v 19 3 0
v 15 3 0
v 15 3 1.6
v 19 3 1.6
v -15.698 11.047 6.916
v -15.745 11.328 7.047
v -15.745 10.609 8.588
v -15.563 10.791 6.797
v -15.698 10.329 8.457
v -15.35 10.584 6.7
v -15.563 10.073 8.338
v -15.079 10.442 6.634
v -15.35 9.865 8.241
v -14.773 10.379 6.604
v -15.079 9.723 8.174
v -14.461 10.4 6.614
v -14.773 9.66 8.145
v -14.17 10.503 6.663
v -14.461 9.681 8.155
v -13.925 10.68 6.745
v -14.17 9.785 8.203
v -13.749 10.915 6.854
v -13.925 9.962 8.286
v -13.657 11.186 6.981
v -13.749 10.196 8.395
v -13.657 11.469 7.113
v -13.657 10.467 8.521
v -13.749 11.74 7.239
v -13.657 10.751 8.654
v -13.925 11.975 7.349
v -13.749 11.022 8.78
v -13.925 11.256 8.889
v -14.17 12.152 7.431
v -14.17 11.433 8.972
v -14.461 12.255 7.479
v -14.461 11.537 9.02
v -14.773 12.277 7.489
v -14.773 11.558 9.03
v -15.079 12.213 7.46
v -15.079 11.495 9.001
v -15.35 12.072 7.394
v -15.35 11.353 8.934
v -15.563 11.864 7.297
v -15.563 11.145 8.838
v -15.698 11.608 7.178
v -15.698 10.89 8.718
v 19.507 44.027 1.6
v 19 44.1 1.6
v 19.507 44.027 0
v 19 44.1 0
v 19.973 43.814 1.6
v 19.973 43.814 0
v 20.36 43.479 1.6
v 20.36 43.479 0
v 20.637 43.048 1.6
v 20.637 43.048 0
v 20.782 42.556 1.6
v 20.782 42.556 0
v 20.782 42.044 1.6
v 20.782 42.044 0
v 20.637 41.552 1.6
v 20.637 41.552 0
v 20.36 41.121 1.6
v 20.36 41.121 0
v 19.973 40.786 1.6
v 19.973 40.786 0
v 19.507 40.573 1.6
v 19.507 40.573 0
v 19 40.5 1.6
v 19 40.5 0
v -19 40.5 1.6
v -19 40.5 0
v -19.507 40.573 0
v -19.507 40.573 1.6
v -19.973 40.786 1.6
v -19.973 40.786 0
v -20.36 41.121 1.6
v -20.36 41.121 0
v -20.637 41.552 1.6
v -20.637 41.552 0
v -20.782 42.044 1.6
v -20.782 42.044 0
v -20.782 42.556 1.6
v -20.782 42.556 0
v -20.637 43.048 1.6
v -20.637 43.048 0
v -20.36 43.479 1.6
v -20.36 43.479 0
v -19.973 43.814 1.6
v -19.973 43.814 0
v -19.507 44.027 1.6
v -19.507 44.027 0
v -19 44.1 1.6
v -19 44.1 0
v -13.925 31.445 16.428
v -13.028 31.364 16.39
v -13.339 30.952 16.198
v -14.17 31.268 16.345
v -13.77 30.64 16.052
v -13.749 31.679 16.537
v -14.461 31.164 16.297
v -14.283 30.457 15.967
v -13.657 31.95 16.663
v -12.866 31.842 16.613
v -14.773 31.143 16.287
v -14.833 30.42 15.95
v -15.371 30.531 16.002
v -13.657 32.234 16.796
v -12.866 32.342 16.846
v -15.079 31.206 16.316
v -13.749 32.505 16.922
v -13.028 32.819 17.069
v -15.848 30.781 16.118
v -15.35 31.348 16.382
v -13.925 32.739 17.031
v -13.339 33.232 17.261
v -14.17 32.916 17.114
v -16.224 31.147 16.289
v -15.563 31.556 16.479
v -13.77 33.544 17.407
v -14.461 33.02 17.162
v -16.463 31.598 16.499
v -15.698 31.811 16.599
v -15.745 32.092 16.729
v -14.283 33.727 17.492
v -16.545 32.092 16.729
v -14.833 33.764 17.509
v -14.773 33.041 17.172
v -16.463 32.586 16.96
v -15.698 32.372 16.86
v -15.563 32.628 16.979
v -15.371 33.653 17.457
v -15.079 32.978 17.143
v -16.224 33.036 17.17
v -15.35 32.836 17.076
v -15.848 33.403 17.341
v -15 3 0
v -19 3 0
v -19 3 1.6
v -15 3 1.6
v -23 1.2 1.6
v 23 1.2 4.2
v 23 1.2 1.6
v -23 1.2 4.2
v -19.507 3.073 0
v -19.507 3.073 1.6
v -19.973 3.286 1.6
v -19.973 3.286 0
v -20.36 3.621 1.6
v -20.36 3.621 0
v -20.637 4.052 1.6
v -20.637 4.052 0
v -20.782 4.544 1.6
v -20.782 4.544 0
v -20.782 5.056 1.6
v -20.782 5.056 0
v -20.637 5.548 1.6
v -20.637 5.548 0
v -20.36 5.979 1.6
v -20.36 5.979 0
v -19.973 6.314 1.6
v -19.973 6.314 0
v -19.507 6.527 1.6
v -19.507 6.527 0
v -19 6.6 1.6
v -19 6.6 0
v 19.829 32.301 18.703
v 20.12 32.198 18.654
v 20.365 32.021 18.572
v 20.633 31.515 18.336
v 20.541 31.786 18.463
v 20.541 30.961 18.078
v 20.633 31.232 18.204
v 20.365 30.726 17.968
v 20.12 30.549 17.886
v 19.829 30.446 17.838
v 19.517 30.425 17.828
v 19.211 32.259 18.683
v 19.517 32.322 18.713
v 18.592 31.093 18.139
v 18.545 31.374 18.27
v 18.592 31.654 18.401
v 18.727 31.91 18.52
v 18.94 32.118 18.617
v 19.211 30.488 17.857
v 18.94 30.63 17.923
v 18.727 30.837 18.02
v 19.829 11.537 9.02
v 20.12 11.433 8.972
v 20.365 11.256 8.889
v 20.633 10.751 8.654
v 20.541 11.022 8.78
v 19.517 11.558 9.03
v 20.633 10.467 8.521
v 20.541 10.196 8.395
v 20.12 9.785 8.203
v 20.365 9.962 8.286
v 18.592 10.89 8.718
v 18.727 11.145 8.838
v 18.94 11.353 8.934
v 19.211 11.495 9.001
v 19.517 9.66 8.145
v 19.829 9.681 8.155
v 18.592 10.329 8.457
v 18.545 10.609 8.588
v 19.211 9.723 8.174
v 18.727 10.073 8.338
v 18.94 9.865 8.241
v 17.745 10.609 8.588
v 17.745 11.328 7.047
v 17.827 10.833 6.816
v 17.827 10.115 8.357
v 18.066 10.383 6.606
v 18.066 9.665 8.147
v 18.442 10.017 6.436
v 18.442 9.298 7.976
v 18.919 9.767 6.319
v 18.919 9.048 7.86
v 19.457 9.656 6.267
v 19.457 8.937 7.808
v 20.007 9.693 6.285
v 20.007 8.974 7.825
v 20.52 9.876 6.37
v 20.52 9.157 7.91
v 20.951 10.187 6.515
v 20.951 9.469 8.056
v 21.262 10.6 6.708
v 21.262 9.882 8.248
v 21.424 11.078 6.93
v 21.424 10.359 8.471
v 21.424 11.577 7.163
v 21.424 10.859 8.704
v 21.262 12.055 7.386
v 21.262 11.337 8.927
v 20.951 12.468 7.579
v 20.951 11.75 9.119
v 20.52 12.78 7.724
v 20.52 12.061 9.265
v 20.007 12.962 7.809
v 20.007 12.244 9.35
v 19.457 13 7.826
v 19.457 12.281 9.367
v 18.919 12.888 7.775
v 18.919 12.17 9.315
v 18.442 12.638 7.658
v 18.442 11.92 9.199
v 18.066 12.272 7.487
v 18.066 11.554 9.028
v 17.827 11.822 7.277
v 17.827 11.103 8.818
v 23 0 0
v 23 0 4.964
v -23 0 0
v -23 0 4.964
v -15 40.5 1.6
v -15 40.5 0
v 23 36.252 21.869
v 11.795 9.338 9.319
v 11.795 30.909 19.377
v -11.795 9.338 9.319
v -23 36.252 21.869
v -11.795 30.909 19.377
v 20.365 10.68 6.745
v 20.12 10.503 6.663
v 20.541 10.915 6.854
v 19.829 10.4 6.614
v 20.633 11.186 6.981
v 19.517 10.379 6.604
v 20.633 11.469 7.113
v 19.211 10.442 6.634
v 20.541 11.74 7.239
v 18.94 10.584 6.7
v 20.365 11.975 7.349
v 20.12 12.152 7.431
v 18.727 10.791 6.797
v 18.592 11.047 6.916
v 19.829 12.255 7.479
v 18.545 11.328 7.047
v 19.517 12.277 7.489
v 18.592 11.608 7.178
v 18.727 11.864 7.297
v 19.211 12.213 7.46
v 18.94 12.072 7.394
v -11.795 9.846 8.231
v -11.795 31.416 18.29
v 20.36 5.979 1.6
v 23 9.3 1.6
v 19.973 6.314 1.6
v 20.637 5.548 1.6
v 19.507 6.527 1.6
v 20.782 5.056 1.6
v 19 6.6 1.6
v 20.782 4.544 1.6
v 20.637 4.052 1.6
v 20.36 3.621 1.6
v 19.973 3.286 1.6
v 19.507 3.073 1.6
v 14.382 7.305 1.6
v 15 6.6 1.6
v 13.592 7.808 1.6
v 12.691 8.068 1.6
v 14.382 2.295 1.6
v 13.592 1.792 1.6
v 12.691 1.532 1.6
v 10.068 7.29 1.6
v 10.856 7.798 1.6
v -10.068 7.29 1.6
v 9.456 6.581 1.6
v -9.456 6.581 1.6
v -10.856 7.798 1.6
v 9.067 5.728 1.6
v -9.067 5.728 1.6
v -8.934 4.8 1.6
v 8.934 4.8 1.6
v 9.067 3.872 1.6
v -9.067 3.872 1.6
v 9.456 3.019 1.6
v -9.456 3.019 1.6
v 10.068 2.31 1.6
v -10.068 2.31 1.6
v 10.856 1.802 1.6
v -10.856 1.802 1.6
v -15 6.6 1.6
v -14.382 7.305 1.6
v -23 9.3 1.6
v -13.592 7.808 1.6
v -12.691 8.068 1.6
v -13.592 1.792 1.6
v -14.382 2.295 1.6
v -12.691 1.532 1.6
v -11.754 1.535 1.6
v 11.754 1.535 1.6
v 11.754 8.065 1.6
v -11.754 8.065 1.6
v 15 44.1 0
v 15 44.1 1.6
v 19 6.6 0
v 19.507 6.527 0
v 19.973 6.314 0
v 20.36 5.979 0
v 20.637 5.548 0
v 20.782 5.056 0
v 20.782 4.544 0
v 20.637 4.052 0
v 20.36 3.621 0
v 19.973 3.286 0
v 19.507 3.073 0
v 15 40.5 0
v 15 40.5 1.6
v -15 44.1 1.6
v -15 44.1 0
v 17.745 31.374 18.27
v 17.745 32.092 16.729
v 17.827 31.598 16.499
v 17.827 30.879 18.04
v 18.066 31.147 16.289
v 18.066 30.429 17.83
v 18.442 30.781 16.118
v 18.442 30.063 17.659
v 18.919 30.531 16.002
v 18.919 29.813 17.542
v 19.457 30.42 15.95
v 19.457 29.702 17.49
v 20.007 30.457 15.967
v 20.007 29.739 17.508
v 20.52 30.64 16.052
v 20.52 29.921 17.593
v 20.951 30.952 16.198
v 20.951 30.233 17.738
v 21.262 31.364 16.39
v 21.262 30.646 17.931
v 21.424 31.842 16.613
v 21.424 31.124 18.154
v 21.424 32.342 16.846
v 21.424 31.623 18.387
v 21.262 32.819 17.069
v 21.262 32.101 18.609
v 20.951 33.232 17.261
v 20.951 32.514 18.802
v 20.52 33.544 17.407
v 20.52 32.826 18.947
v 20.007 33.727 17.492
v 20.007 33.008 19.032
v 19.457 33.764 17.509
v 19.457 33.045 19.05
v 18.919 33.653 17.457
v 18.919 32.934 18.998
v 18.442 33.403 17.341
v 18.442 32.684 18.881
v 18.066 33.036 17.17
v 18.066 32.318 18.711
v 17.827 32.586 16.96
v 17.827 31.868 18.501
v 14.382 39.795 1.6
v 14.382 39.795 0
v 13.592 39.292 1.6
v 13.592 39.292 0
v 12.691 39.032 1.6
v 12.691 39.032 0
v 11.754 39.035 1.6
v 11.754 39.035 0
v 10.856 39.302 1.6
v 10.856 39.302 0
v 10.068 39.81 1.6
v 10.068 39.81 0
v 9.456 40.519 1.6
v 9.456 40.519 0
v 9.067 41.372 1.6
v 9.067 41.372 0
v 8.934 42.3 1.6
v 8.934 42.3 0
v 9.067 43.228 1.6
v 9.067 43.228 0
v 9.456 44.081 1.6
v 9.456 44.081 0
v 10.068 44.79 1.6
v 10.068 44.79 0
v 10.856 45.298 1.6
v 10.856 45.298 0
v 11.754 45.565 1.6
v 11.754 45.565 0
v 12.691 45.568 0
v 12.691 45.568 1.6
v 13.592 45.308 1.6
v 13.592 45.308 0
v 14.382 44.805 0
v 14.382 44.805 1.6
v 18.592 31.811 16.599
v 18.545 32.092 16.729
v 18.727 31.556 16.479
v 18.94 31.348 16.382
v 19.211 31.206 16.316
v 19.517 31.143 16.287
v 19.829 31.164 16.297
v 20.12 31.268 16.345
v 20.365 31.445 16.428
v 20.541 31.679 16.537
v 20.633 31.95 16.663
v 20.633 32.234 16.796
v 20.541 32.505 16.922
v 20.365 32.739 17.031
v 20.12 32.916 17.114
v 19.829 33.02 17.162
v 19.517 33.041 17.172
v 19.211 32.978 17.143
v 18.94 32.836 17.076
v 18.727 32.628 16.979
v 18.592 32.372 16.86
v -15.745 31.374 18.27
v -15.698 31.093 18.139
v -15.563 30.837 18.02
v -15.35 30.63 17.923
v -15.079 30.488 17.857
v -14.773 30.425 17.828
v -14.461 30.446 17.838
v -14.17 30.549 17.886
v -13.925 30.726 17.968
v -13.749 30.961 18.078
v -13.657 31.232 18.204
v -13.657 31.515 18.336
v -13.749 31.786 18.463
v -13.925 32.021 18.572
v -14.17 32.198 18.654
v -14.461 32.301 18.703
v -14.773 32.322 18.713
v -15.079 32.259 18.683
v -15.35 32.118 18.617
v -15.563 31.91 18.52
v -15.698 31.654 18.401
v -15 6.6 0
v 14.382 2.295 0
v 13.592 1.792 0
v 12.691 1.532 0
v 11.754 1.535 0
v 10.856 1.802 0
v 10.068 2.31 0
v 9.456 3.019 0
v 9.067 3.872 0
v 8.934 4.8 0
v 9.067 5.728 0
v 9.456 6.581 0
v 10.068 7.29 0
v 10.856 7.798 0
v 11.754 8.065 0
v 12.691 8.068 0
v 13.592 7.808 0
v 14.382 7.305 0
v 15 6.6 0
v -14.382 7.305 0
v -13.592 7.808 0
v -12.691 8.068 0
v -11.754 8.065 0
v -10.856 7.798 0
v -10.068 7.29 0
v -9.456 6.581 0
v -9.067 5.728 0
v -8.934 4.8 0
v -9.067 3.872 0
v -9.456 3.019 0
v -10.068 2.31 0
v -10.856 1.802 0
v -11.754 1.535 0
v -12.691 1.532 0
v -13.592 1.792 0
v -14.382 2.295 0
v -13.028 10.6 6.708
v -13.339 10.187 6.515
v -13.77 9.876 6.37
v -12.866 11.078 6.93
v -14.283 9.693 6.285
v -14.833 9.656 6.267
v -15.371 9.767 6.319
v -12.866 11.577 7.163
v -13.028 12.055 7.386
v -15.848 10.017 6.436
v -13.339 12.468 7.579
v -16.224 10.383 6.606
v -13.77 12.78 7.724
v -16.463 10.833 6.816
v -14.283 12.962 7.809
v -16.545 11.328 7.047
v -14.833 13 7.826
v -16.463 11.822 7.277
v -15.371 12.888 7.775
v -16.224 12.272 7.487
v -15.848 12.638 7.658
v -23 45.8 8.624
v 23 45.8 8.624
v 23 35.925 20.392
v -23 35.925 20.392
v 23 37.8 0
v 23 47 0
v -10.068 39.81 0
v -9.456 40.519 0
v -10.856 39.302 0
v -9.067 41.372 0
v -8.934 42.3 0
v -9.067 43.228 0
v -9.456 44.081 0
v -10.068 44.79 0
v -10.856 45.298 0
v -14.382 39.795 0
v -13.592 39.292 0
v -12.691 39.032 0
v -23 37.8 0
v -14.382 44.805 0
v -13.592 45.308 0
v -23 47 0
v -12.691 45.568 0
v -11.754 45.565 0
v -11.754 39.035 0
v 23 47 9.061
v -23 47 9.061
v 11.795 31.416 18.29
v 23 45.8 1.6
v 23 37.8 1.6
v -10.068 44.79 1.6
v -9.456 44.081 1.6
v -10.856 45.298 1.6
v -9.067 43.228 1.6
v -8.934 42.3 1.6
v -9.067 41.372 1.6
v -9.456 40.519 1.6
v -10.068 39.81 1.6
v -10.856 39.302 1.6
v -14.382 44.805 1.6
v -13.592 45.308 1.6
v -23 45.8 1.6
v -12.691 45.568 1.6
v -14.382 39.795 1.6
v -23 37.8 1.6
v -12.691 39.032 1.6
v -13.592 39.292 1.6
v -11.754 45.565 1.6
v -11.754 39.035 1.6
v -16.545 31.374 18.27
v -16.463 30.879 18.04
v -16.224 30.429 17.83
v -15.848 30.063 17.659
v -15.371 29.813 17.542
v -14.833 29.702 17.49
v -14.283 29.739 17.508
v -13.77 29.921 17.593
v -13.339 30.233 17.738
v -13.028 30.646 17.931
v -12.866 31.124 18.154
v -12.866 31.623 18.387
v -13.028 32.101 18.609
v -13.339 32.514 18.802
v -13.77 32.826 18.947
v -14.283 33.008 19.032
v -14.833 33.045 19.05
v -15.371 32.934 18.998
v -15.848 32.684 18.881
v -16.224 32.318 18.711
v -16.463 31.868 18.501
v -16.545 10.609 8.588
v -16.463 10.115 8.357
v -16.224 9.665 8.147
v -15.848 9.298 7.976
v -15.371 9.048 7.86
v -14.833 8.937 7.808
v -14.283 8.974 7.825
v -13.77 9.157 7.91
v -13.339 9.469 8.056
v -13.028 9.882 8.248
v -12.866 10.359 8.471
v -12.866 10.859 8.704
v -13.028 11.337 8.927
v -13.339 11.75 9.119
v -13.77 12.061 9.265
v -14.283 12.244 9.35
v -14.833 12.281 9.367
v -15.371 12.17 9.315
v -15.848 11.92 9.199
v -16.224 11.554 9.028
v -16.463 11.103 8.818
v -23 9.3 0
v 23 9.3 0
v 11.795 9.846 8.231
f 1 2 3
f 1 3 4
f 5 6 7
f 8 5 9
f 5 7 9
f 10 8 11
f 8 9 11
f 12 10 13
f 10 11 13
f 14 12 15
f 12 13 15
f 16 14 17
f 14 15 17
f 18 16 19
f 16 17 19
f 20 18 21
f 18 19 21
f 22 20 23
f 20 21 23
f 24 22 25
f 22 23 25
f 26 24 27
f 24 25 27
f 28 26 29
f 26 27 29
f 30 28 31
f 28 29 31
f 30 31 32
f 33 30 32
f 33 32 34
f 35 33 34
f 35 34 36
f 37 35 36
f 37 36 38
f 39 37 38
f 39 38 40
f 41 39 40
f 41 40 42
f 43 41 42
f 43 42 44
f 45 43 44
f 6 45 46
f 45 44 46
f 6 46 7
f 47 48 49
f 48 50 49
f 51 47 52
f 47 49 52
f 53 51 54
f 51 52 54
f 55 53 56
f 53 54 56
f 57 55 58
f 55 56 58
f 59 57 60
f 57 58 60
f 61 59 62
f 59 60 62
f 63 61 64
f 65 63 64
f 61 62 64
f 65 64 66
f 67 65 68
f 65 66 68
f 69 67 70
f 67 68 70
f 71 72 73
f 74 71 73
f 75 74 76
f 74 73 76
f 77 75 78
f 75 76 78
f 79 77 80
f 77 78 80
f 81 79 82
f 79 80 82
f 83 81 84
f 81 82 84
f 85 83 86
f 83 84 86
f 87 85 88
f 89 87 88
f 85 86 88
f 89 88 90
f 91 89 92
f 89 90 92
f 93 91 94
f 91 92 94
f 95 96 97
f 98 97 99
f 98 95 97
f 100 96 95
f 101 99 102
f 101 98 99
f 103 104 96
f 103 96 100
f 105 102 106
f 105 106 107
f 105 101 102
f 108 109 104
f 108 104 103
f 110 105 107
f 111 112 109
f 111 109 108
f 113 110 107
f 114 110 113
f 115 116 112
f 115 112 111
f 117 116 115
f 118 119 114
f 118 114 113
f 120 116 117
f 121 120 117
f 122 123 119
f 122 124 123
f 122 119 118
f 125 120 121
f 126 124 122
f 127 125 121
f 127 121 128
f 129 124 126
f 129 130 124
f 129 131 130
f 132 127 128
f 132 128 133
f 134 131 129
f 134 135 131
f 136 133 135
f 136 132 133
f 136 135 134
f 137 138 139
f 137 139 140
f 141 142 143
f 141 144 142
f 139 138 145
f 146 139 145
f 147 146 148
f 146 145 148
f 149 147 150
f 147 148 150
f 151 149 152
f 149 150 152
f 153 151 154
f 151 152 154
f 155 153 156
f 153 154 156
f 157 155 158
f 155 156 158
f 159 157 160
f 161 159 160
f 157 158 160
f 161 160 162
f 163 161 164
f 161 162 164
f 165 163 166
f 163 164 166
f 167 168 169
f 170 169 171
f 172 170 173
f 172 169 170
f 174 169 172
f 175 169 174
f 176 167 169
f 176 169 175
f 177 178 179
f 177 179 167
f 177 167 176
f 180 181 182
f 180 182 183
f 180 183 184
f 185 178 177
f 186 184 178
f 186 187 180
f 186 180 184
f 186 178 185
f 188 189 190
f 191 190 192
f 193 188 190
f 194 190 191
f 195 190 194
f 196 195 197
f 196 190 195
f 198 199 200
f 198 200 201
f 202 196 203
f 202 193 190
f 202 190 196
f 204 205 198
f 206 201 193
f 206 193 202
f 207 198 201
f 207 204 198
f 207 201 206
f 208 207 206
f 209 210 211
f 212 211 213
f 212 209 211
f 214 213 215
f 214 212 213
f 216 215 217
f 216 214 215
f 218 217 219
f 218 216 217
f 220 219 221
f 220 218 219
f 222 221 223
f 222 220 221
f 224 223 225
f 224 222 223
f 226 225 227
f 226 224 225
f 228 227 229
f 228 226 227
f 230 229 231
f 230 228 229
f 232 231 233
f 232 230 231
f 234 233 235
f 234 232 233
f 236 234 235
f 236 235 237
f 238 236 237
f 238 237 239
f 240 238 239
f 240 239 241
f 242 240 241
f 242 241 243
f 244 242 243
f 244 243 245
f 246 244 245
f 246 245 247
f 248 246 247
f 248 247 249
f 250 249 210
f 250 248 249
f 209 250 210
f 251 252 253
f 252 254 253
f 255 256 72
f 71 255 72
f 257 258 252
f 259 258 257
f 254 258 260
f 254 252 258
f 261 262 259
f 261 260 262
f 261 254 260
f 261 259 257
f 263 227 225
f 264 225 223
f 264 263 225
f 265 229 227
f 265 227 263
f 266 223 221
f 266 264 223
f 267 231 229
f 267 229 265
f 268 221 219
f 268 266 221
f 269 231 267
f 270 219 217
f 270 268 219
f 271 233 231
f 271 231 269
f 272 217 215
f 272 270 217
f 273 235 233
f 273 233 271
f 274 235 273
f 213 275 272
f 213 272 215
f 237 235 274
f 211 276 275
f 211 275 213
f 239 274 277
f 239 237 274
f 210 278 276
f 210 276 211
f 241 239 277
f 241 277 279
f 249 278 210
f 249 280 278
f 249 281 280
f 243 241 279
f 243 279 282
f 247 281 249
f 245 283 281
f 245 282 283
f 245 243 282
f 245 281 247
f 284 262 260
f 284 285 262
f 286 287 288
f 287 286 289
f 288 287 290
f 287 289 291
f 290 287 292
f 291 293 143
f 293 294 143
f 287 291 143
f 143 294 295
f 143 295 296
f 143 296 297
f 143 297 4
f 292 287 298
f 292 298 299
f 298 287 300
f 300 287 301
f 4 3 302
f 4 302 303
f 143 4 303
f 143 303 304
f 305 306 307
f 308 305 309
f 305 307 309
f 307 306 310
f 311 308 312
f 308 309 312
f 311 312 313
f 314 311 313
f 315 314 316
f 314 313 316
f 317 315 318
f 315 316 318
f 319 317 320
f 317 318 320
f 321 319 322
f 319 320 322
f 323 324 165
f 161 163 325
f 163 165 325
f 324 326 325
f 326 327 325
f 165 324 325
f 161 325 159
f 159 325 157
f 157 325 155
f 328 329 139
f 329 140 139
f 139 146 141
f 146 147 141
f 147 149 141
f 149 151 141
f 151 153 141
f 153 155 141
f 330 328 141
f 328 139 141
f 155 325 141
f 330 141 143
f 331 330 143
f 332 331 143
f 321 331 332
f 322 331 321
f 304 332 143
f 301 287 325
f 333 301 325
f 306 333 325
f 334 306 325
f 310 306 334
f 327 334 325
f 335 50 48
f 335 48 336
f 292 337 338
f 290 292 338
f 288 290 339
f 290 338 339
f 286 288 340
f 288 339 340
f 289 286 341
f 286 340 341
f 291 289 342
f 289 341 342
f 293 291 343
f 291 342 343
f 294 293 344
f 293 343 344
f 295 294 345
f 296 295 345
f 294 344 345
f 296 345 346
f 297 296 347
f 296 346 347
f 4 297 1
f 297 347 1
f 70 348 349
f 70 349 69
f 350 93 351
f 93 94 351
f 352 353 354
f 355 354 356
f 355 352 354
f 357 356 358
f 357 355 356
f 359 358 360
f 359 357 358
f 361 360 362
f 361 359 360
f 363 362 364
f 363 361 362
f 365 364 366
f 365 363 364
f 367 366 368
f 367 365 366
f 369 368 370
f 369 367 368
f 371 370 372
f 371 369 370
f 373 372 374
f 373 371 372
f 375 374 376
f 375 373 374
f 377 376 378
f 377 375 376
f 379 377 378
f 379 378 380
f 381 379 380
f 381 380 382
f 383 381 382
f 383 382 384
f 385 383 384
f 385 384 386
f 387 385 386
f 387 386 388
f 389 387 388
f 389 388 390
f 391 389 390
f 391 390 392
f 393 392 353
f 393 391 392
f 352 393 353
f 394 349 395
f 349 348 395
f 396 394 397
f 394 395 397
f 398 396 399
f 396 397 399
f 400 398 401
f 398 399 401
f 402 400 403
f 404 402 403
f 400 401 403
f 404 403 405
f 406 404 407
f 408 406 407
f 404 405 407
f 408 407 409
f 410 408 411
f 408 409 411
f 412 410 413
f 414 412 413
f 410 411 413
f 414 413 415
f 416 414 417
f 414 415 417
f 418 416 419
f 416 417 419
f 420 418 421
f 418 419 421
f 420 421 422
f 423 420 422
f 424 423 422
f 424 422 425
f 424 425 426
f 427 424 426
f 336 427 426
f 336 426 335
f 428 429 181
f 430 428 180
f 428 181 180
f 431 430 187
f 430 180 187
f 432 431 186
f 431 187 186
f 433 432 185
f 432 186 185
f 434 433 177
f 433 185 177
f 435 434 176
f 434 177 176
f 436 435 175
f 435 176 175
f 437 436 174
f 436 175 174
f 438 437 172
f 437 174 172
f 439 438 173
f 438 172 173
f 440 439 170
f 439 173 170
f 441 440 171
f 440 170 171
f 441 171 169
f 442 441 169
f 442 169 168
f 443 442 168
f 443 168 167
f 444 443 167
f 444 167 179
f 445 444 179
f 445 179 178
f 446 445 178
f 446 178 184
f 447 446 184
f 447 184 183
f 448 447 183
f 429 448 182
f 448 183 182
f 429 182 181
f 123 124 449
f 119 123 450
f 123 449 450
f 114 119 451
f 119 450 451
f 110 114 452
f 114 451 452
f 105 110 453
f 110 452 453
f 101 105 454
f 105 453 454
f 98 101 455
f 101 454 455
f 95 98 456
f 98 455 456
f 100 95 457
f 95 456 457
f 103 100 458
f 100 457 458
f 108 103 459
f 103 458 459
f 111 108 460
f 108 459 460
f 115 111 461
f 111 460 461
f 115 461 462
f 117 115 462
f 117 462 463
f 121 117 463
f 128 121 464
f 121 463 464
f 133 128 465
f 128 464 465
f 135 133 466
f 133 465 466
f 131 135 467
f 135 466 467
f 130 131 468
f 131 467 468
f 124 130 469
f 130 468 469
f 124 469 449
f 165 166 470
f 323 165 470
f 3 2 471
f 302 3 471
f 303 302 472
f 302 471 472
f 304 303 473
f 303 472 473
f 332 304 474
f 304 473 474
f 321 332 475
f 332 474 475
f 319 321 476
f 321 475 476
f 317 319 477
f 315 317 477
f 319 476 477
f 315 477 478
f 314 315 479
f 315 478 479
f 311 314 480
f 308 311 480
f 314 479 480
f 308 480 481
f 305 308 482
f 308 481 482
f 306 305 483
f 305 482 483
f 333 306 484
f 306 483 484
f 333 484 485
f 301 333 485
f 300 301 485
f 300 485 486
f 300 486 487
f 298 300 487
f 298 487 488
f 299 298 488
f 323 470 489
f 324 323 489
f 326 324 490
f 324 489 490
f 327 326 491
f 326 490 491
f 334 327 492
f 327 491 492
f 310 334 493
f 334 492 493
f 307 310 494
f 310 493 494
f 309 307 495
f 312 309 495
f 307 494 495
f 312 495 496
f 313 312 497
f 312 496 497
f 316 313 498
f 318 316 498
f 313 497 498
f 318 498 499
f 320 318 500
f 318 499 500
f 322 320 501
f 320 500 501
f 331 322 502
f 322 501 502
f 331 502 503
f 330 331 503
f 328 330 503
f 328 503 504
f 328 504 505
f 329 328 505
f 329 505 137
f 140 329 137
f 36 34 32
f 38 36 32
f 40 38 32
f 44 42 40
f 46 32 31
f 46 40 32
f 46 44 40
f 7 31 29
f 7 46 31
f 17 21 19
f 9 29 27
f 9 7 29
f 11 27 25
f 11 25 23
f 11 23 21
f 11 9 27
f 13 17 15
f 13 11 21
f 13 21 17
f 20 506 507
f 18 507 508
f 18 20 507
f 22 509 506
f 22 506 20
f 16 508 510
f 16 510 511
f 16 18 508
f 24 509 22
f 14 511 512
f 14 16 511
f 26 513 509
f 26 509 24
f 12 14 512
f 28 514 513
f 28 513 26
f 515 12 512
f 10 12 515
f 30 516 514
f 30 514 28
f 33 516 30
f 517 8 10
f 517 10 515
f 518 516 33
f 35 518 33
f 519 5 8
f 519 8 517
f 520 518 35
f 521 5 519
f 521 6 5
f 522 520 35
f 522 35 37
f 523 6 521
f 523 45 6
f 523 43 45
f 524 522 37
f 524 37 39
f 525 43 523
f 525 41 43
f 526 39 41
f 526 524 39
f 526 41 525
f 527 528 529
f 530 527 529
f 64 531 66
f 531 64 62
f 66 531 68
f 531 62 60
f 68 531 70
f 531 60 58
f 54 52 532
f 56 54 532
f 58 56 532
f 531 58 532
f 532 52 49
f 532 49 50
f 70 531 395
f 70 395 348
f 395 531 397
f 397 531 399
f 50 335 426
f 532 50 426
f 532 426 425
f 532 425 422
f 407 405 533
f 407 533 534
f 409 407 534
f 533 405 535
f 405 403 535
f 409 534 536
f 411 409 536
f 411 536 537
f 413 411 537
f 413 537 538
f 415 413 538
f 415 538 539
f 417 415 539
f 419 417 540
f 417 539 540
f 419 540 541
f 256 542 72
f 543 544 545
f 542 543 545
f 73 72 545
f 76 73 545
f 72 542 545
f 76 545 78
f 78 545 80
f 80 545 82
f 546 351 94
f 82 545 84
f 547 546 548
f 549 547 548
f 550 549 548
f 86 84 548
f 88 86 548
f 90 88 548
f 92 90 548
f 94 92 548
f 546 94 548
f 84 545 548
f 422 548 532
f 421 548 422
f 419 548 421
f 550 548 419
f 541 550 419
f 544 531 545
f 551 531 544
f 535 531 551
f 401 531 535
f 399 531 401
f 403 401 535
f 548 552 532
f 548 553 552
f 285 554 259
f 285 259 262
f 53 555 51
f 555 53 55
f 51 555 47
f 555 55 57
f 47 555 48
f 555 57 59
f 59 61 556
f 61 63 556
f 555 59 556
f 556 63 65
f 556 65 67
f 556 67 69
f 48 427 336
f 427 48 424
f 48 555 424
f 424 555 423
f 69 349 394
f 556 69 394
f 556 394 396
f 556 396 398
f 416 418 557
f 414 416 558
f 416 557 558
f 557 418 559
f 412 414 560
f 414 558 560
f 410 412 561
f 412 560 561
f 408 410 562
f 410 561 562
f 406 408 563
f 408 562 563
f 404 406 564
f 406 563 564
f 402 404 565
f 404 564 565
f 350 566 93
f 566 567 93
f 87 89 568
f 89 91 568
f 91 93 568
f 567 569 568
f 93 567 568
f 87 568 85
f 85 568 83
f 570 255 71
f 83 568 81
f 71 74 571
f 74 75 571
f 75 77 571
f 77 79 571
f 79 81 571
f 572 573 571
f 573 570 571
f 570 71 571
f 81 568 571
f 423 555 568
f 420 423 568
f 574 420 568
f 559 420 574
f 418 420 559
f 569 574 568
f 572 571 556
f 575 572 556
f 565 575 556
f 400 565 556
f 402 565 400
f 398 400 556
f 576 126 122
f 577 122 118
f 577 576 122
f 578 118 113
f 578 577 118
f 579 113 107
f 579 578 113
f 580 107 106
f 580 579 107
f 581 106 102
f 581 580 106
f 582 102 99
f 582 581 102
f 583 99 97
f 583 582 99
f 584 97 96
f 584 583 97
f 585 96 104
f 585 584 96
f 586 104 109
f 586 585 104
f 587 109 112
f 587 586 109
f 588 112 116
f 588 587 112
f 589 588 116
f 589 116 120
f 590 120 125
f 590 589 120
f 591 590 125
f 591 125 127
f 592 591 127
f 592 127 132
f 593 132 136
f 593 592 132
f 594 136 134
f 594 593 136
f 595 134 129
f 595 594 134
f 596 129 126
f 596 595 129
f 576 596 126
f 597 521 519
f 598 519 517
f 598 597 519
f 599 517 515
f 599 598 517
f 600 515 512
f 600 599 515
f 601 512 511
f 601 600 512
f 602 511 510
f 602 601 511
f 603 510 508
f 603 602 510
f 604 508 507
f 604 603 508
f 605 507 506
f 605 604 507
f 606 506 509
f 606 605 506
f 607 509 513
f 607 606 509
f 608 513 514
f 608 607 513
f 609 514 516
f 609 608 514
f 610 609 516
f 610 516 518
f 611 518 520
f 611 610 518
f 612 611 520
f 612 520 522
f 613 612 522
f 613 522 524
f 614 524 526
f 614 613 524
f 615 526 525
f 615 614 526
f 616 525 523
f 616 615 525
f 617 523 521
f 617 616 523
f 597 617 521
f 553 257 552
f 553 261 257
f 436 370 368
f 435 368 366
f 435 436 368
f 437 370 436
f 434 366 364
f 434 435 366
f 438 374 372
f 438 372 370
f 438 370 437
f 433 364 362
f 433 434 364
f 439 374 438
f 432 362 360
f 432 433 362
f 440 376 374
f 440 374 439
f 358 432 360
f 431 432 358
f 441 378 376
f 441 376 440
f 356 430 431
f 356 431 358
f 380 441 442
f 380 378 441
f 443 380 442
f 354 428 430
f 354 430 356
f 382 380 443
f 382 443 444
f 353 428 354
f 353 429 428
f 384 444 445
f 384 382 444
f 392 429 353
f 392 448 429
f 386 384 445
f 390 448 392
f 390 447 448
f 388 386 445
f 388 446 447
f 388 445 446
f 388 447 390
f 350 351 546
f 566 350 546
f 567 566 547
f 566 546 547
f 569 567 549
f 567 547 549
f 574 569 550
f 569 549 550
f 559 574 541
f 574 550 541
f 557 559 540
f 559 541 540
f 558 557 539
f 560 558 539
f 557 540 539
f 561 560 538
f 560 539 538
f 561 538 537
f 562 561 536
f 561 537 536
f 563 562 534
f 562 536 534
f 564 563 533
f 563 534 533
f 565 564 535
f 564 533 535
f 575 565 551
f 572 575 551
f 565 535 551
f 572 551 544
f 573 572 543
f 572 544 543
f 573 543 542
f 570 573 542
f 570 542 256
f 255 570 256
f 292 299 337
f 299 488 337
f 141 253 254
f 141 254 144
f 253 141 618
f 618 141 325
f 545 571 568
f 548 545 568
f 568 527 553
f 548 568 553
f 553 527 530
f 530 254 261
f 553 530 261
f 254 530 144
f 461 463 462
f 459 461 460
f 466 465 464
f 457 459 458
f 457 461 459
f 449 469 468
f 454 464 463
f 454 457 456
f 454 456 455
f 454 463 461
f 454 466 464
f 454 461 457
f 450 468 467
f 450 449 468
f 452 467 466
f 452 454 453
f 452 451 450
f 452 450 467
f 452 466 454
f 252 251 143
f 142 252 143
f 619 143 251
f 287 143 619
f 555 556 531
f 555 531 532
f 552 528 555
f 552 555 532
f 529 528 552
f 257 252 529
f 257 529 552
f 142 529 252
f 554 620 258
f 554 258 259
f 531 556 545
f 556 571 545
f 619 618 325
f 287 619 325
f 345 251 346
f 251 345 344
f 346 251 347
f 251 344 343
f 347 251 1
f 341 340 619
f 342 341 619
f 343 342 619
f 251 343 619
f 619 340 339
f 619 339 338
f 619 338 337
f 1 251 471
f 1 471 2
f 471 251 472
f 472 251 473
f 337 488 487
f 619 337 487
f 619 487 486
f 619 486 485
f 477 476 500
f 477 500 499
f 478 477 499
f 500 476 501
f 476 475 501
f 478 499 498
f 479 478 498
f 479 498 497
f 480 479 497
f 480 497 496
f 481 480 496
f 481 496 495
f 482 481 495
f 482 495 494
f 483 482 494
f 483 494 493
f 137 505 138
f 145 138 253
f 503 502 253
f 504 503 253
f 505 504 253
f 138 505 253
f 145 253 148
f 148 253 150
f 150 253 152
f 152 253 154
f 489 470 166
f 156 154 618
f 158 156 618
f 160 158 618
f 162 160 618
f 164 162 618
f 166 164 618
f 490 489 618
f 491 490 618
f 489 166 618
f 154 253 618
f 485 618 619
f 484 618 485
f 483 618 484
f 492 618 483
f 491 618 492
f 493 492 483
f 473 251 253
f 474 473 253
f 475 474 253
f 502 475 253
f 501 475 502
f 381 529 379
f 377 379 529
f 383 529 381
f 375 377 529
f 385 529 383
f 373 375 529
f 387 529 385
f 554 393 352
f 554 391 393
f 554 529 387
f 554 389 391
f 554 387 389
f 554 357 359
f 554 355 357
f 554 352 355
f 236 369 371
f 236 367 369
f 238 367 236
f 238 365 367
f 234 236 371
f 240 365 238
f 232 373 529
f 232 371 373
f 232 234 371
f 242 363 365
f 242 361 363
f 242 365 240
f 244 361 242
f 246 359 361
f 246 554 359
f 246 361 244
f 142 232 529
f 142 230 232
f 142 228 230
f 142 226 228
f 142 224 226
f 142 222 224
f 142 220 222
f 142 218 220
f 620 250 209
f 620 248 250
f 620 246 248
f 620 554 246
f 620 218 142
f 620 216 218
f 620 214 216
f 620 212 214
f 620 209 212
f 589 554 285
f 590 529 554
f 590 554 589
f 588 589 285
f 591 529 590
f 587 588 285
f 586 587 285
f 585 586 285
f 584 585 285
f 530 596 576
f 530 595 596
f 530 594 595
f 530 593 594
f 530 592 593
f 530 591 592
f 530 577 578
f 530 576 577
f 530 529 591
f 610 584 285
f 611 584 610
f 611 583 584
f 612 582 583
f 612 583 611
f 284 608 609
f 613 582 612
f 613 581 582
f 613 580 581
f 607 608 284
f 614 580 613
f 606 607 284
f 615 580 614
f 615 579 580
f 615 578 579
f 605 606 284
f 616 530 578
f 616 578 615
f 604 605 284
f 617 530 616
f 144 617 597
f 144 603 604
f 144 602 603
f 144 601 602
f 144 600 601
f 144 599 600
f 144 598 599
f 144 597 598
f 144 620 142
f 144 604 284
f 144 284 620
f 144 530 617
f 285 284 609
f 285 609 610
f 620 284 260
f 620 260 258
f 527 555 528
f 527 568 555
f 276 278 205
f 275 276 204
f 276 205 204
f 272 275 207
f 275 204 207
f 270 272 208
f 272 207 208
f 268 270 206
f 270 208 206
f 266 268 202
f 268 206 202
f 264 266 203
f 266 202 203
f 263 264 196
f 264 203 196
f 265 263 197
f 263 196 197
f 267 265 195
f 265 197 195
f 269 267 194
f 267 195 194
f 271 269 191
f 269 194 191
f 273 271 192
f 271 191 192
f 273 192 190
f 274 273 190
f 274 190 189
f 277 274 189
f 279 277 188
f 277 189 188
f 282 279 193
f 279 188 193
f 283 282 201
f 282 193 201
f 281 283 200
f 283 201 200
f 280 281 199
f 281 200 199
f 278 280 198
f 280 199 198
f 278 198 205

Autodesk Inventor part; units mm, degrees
ref_plane "XZ Plane" through (0, 0, 0) normal (0, 1, 0) x (-1, 0, 0)
ref_plane "XY Plane" through (0, 0, 0) normal (0, 0, 1) x (1, 0, 0)
sketch "Sketch1" plane through (0, 0, 0) normal (1, 0, 0) x (0, 1, 0)
  line L0 (0, 4.9645) -> (36.2523, 21.8692)
  line L1 (36.2523, 21.8692) -> (47, 9.0606)
  line L2 (45.8, 1.6) -> (45.8, 8.6239)
  line L3 (45.8, 8.6239) -> (35.9249, 20.3925)
  line L4 (35.9249, 20.3925) -> (1.2, 4.2)
  line L5 (0, 4.9645) -> (0, 0)
  line L6 (47, 9.0606) -> (47, 0)
  line L7 (0, 0) -> (9.3, 0)
  line L8 (9.3, 0) -> (9.3, 1.6)
  line L9 (9.3, 1.6) -> (4.8, 1.6)
  line L10 (1.2, 4.2) -> (1.2, 1.6)
  line L11 (45.8, 1.6) -> (42.3, 1.6)
  line L12 (37.8, 1.6) -> (37.8, 0)
  line L13 (37.8, 0) -> (47, 0)
  line L14 (4.8, 1.6) -> (4.8, 0) construction
  line L15 (42.3, 1.6) -> (42.3, 0) construction
  line L16 (42.3, 1.6) -> (37.8, 1.6)
  line L17 (4.8, 1.6) -> (1.2, 1.6)
  dimension "d1" = 1.2
  dimension "d3" = 1.2
  dimension "d4" = 1.2
  dimension "d25" = 40
  dimension "d26" = 25
  dimension "d27" = 1.6
  dimension "d28" = 1.2
  dimension "d29" = 37.5
  dimension "d37" = 105
  dimension "d38" = 4.5
  dimension "d39" = 2.6
  dimension "d42" = 3.5
  dimension "d43" = 3.6
extrude "Extrusion1" add sketch "Sketch1" along normal mid plane 46
sketch "Sketch3" plane through (23, 35.9249, 20.3925) normal (0, 0.4226, -0.9063) x (-1, 0, 0)
  circle A0 centre (3.405, -5.0219) radius 1.05
  circle A1 centre (37.695, -5.0219) radius 1.05
  circle A2 centre (37.695, -27.9329) radius 1.05
  circle A3 centre (3.405, -27.9329) radius 1.05
  line L0 (0, -39.4135) -> (0, 0) construction
  line L1 (46, 0) -> (46, -39.4135) construction
  circle A4 centre (3.405, -5.0219) radius 1.85
  circle A5 centre (37.695, -5.0219) radius 1.85
  circle A6 centre (37.695, -27.9329) radius 1.85
  circle A7 centre (3.405, -27.9329) radius 1.85
  line L2 (11.205, -4.9754) -> (34.795, -4.9754)
  line L3 (34.795, -4.9754) -> (34.795, -28.7754)
  line L4 (34.795, -28.7754) -> (11.205, -28.7754)
  line L5 (11.205, -28.7754) -> (11.205, -4.9754)
  line L6 (23, -4.9754) -> (23, -28.7754) construction
  line L7 (11.205, -16.8754) -> (0, -16.8754) construction
  line L8 (34.795, -16.8754) -> (46, -16.8754) construction
  point P0 (23, -41.1773)
  dimension "d13" = 34.29
  dimension "d14" = 22.911
  dimension "d15" = 2.1
  dimension "d16" = 0.8
  dimension "d17" = 7.8
  dimension "d18" = 2.9
  dimension "d19" = 23.8
  dimension "d44" = 0.0465
extrude "Extrusion2" add sketch "Sketch3" along normal blind 1.7 contours A4 | A5 | A6 | A7
extrude "Extrusion3" cut sketch "Sketch3" against normal up to surface (1.2 mm away) contours L2 L3 L4 L5
sketch "Sketch5" plane through (-23, 0, 0) normal (0, 0, -1) x (-1, 0, 0)
  arc A0 (-4, 3) -> (-4, 6.6) centre (-4, 4.8) ccw
  arc A1 (-42, 6.6) -> (-42, 3) centre (-42, 4.8) ccw
  arc A2 (-42, 44.1) -> (-42, 40.5) centre (-42, 42.3) ccw
  arc A3 (-4, 40.5) -> (-4, 44.1) centre (-4, 42.3) ccw
  line L0 (0, 9.3) -> (0, 0) construction
  line L1 (-46, 9.3) -> (0, 9.3) construction
  line L2 (-46, 0) -> (-46, 9.3) construction
  line L3 (-46, 0) -> (0, 0) construction
  line L4 (0, 47) -> (0, 37.8) construction
  line L5 (-46, 47) -> (0, 47) construction
  line L6 (-46, 37.8) -> (-46, 47) construction
  line L7 (-46, 37.8) -> (0, 37.8) construction
  line L8 (-23, -9.4) -> (-23, 56.4) projected
  arc A4 (-8, 6.6) -> (-8, 3) centre (-8, 4.8) ccw construction
  line L9 (-4, 6.6) -> (-8, 6.6)
  line L10 (-4, 3) -> (-8, 3)
  arc A5 (-38, 3) -> (-38, 6.6) centre (-38, 4.8) ccw construction
  arc A6 (-38, 40.5) -> (-38, 44.1) centre (-38, 42.3) ccw construction
  arc A7 (-8, 44.1) -> (-8, 40.5) centre (-8, 42.3) ccw construction
  line L11 (-38, 3) -> (-42, 3)
  line L12 (-38, 6.6) -> (-42, 6.6)
  line L13 (-38, 40.5) -> (-42, 40.5)
  line L14 (-42, 44.1) -> (-38, 44.1)
  line L15 (-4, 44.1) -> (-8, 44.1)
  line L16 (-8, 40.5) -> (-4, 40.5)
  arc A8 (-8, 6.6) -> (-8, 3) centre (-10.7659, 4.8) ccw
  arc A9 (-38, 3) -> (-38, 6.6) centre (-35.2341, 4.8) ccw
  arc A10 (-8, 44.1) -> (-8, 40.5) centre (-10.7659, 42.3) ccw
  arc A11 (-38, 40.5) -> (-38, 44.1) centre (-35.2341, 42.3) ccw
  point P0 (-23, 0)
  point P1 (-23, 4.8)
  dimension "d30" = 37.5
  dimension "d31" = 38
  dimension "d32" = 3.6
  dimension "d33" = 4
  dimension "d34" = 6.6
extrude "Extrusion4" cut sketch "Sketch5" against normal up to next
ref_plane "Work Plane1" through (18.75, 0, 0) normal (1, 0, 0) x (0, 1, 0)
ref_plane "Work Plane2" through (-18.75, 0, 0) normal (1, 0, 0) x (0, 1, 0)
ref_plane "Work Plane3" through (15, 42.3, 1.6) normal (0, -1, 0) x (1, 0, 0)
properties part number "DisplayMount"
